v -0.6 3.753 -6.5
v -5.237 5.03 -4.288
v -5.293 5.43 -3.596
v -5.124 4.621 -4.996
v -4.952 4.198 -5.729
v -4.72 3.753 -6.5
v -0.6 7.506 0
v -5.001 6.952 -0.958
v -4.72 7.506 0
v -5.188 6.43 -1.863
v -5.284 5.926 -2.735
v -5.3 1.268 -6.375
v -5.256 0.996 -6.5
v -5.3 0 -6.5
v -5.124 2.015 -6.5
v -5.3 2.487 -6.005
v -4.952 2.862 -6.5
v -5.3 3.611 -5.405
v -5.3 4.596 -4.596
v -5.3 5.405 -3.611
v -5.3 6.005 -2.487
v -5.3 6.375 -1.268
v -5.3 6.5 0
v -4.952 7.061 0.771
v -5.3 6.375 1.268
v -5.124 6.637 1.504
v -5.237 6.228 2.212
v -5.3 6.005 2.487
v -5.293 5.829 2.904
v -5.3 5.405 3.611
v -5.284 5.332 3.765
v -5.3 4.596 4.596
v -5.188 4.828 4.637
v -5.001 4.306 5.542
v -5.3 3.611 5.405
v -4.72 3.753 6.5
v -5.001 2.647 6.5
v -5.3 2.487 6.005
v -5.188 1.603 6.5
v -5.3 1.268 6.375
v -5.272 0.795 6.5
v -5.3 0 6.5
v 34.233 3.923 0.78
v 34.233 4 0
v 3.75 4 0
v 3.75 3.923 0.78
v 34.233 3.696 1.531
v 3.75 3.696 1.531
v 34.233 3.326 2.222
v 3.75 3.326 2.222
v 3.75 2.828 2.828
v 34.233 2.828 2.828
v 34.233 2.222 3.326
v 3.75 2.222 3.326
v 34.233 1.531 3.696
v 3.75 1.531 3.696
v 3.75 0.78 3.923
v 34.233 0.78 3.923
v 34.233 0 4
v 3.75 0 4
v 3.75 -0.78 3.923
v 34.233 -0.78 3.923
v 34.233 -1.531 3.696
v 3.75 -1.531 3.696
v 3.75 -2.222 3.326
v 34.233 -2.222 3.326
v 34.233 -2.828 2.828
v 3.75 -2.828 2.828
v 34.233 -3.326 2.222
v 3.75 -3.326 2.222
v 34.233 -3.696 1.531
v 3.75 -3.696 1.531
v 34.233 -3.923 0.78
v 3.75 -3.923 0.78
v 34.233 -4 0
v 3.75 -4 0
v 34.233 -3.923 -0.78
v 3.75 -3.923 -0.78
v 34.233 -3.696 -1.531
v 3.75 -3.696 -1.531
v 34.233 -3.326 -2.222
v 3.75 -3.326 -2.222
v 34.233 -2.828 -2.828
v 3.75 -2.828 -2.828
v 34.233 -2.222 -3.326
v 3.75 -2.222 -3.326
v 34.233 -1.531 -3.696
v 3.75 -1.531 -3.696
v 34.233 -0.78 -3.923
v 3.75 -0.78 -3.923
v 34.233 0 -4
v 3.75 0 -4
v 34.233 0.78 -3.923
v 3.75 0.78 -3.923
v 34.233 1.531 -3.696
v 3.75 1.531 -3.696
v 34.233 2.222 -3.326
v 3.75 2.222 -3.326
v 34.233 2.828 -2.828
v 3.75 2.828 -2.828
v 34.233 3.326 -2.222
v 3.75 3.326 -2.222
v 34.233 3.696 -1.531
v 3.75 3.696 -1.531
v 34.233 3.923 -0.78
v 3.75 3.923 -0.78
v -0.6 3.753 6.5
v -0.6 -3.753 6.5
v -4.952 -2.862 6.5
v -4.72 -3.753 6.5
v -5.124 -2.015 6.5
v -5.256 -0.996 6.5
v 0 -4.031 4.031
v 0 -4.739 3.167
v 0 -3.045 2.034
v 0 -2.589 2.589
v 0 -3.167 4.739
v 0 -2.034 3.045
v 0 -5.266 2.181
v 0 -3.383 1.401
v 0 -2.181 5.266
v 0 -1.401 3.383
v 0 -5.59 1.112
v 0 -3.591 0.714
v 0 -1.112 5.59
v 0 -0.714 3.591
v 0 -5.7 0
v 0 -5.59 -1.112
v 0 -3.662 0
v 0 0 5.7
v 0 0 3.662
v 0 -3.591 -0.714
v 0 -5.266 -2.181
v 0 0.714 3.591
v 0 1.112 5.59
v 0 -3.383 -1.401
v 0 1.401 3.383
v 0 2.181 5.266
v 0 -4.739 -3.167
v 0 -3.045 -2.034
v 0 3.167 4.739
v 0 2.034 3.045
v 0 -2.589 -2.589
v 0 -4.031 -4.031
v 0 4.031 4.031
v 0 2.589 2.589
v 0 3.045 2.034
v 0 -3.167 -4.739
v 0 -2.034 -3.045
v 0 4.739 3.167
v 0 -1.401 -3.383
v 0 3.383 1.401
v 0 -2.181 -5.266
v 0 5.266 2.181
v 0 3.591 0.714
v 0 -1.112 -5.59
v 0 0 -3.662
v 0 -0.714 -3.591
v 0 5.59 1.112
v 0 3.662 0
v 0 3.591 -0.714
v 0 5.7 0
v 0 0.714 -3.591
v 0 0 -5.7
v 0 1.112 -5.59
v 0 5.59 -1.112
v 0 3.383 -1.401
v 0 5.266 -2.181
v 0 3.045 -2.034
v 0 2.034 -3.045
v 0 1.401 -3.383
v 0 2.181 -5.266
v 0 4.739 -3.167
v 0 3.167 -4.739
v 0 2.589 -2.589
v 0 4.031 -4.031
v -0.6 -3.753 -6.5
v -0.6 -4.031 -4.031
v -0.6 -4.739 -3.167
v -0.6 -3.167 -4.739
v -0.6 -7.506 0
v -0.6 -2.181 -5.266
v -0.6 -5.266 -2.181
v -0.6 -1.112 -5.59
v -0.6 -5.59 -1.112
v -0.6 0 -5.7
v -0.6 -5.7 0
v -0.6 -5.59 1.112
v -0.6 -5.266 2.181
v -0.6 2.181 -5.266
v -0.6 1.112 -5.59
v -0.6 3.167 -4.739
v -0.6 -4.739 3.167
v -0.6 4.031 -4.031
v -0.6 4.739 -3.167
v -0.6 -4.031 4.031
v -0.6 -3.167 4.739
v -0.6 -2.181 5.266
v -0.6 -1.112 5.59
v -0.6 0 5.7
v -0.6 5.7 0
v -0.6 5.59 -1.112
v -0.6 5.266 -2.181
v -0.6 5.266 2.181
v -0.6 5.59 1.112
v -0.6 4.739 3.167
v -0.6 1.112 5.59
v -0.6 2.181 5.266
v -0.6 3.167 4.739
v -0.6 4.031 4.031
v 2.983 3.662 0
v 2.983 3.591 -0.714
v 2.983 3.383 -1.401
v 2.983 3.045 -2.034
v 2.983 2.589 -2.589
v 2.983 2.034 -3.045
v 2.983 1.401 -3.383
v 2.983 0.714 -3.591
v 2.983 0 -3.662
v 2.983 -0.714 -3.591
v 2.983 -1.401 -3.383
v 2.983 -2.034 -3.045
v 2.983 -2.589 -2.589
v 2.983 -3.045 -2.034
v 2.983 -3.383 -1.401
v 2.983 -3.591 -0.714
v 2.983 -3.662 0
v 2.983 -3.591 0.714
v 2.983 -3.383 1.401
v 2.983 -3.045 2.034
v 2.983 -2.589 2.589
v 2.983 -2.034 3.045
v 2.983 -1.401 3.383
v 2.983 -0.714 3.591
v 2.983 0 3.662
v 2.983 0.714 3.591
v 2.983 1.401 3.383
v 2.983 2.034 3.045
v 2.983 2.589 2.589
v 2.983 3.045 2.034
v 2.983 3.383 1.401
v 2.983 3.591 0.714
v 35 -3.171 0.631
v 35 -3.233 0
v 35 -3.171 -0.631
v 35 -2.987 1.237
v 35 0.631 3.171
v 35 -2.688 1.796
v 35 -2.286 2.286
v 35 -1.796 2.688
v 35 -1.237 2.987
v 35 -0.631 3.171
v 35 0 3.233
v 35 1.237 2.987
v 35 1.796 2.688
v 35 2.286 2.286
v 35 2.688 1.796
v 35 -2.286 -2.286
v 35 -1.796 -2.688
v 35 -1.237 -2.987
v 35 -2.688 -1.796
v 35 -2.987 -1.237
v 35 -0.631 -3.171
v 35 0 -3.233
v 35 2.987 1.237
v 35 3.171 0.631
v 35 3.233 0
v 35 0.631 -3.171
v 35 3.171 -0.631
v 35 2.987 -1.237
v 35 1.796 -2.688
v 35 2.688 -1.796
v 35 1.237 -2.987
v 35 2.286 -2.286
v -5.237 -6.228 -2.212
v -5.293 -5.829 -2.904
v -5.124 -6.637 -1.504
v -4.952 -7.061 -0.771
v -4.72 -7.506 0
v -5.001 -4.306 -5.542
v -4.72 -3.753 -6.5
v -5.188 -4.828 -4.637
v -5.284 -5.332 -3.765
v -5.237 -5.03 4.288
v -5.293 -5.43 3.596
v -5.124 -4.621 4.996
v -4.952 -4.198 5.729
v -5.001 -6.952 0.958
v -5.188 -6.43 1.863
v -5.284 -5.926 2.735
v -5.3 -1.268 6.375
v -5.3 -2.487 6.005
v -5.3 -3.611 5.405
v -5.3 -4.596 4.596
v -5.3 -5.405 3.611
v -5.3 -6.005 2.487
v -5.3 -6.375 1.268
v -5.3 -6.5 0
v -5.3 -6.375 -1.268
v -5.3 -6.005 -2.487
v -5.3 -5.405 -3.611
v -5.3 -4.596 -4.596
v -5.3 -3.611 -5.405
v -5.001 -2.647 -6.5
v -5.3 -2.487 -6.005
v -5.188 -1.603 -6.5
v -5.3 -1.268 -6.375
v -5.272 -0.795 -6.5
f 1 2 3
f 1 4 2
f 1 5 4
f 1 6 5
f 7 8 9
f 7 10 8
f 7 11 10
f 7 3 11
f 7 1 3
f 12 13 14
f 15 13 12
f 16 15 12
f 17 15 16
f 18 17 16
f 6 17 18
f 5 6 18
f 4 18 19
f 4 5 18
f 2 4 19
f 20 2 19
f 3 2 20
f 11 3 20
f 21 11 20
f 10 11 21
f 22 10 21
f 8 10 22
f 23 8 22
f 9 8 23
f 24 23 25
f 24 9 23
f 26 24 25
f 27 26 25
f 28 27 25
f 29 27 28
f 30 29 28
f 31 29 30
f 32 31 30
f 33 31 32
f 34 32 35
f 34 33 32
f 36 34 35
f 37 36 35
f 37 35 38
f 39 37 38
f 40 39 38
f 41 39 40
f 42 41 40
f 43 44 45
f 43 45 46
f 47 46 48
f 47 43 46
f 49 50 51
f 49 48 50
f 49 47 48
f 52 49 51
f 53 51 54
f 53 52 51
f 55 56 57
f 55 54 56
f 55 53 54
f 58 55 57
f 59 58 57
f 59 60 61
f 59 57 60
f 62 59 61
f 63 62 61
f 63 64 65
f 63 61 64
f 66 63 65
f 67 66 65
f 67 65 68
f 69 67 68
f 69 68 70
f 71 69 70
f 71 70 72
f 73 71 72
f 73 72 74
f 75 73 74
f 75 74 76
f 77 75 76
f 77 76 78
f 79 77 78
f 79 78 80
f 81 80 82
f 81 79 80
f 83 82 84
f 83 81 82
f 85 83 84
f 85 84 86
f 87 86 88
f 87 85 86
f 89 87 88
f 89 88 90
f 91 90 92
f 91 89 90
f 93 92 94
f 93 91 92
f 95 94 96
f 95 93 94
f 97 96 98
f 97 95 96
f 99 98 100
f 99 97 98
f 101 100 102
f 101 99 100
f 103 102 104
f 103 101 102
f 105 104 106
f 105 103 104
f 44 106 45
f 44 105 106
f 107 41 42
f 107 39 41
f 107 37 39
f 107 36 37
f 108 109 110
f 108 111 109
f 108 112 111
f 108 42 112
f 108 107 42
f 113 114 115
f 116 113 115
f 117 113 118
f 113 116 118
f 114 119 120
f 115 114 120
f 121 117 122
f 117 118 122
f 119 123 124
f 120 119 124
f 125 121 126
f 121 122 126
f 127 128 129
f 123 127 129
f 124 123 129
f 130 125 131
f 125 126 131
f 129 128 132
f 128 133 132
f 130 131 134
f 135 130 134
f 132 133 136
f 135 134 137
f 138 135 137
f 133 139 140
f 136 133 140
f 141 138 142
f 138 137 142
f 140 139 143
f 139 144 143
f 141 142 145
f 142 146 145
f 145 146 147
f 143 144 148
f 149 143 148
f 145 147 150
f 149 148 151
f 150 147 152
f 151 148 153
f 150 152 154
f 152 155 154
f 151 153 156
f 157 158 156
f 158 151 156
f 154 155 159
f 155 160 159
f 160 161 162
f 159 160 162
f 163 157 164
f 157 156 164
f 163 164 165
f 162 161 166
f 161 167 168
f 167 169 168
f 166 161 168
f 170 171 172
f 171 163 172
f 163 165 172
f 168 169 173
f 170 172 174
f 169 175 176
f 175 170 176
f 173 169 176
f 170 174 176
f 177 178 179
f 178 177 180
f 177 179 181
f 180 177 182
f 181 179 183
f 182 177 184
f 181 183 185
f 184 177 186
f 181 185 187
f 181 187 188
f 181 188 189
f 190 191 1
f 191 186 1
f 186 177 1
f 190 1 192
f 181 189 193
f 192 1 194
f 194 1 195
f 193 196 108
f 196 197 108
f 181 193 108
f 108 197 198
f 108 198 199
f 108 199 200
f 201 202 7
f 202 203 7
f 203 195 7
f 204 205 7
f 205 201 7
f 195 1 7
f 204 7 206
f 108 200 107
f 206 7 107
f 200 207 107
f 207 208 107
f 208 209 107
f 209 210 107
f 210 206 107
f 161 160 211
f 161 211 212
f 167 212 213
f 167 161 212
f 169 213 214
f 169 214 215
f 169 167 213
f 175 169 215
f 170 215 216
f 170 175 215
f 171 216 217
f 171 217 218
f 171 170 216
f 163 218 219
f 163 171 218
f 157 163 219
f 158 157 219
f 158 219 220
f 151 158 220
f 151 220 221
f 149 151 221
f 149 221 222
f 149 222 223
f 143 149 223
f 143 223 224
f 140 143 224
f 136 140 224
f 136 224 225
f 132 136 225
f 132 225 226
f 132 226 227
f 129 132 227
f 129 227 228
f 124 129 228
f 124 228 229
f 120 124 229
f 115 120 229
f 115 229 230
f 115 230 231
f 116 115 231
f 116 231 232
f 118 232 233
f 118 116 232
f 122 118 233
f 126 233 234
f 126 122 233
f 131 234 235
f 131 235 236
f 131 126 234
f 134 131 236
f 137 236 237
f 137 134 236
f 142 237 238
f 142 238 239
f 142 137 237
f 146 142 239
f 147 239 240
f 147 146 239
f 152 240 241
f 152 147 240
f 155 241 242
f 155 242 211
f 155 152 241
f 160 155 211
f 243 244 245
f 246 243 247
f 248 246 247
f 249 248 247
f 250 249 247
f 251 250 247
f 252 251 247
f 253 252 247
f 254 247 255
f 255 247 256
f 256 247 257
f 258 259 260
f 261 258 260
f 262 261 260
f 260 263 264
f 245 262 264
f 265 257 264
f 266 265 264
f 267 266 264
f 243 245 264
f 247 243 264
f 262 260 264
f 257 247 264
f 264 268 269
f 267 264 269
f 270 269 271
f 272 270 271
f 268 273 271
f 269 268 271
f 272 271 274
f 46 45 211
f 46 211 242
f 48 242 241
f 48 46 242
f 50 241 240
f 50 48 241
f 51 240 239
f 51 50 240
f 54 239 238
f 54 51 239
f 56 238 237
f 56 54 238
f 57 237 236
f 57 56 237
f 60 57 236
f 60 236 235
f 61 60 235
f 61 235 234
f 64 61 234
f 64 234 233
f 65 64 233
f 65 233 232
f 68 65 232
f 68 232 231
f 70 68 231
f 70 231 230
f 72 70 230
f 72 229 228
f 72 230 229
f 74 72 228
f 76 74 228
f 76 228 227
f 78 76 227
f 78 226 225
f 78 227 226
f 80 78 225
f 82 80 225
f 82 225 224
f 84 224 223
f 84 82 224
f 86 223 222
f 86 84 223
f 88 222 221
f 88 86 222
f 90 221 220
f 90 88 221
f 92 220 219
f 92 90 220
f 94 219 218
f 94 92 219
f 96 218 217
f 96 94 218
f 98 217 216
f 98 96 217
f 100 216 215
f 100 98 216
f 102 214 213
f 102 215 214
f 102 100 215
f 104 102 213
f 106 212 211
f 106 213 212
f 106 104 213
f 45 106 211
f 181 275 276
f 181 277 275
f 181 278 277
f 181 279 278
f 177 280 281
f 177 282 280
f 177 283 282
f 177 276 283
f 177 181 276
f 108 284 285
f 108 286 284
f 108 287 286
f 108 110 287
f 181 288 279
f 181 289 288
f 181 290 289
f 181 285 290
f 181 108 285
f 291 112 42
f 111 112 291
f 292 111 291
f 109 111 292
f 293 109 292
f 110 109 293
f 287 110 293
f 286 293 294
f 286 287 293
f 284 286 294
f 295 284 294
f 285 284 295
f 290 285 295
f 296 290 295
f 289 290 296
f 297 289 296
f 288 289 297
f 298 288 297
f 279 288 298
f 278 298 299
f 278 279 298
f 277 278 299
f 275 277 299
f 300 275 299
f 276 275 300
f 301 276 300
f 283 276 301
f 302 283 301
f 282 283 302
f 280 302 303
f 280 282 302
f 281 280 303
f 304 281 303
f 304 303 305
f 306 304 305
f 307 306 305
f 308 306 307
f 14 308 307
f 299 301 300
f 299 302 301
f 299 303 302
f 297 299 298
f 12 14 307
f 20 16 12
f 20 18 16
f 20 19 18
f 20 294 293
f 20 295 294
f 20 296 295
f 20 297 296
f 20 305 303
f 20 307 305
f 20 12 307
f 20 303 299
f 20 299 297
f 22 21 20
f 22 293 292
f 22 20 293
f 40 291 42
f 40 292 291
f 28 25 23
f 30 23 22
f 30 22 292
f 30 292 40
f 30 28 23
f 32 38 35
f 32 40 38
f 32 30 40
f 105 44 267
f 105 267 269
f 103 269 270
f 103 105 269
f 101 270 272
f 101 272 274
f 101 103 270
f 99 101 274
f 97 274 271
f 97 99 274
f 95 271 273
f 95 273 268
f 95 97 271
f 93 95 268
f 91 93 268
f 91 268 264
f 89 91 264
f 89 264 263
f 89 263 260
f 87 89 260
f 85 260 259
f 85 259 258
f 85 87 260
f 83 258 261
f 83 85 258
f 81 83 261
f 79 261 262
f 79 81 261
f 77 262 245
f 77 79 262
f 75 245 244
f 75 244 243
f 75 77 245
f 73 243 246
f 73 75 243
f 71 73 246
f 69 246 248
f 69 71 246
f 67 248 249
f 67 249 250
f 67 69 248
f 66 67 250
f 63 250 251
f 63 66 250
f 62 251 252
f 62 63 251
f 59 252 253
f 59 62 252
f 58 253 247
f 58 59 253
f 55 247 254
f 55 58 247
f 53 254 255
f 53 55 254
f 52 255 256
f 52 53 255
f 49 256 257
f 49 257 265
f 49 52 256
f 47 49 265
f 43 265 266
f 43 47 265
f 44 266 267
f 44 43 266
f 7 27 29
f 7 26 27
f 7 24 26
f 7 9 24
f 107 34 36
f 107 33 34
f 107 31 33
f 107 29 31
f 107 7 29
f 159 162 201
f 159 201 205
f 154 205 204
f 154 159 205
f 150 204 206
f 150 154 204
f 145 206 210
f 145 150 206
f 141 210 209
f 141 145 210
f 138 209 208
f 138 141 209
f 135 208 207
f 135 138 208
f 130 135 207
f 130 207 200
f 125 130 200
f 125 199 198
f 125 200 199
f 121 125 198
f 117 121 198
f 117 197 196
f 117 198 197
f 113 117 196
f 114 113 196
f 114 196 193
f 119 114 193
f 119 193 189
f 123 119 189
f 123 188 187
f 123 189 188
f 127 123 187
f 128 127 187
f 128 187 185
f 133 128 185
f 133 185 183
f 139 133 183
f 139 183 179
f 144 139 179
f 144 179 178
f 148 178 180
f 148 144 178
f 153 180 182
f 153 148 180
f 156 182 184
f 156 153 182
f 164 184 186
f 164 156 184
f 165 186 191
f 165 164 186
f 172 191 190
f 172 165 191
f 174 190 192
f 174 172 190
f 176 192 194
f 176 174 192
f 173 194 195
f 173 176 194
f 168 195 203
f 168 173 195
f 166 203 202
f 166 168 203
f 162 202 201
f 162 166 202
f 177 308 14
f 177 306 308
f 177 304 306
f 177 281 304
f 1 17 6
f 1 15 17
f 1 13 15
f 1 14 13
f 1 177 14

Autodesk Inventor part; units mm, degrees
ref_plane "YZ Plane" through (0, 0, 0) normal (1, 0, 0) x (0, 1, 0)
ref_plane "XZ Plane" through (0, 0, 0) normal (0, 1, 0) x (-1, 0, 0)
sketch "Sketch1" plane through (0, 0, 0) normal (0, 0, 1) x (1, 0, 0)
  line L0 (0, 5.7) -> (0, 3.6617)
  line L1 (3.75, 4) -> (35, 4)
  line L2 (35, 4) -> (35, 0)
  line L3 (35, 0) -> (-0.6001, 0)
  line L4 (-7.7201, 0) -> (42.12, 0) projected
  line L5 (-0.6001, 0) -> (-0.6001, 5.7)
  line L6 (-0.6001, 5.7) -> (0, 5.7)
  line L7 (3.75, 4) -> (2.9831, 3.6617)
  line L8 (2.9831, 3.6617) -> (0, 3.6617)
  line L9 (0, -1.14) -> (0, 6.84) projected
  dimension "d0" = 35
  dimension "d1" = 31.25
  dimension "d2" = 8
  dimension "d9" = 0.6001
  dimension "d10" = 11.4
  dimension "d13" = 0.7669
  dimension "d14" = 7.3234
revolve "Body" add sketch "Sketch1" angle 360 about axis through (35, 0, 0) along (-1, 0, 0)
sketch "Sketch2" plane through (-0.6001, 0, 0) normal (-1, 0, 0) x (0, 0, 1)
  line L0 (0, 7.5056) -> (6.5, 3.7528)
  line L1 (6.5, 3.7528) -> (6.5, -3.7528)
  line L2 (6.5, -3.7528) -> (0, -7.5056)
  line L3 (0, -7.5056) -> (-6.5, -3.7528)
  line L4 (-6.5, -3.7528) -> (-6.5, 3.7528)
  line L5 (-6.5, 3.7528) -> (0, 7.5056)
  point P0 (0, 0)
  point P1 (0, 0)
  dimension "d11" = 13
extrude "Head" add sketch "Sketch2" along normal blind 4.7
sketch "Sketch4" plane through (0, 0, 0) normal (0, 0, 1) x (1, 0, 0)
  line L0 (-5.3001, 6.5) -> (-5.3001, 7.5056)
  line L1 (-5.3001, 7.5056) -> (-4.7195, 7.5056)
  line L2 (-4.7195, 7.5056) -> (-5.3001, 6.5)
  line L3 (-6.2401, 0) -> (0.3399, 0) projected
  line L4 (-0.6001, 7.5056) -> (-5.3001, 7.5056) projected
  line L5 (-5.3001, 3.7528) -> (-5.3001, 7.5056) projected
  dimension "d5" = 30
  dimension "d19" = 13
revolve "Chamfer1" cut sketch "Sketch4" angle 360 about axis through (-10, 0, 0) along (1, 0, 0)
thread "Thread" size "M8x1.25" class "6g" standard "ISO Metric profile" length 31.25
chamfer "Chamfer2" distance 0.7668 distance2 0.7669 1 edges at (35, -4, 0) measured on face at (35, -0.3588, 0.308)
ref_plane "Work Plane1" through (1.525, 0, 0) normal (0, 0, 1) x (1, 0, 0)
equation "\"d0\" = NLG"
equation "\"d1\" = GEL"
equation "\"d2\" = GD"
equation "\"d10\" = SD2"
equation "\"d14\" = BDM"
equation "\"d11\" = SW"
equation "\"d3\" = KOH - SD"
equation "\"d5\" = ANG1"
equation "\"d19\" = SW0"
equation "\"d15\" = GEL"
equation "\"d6\" = -0.5 * SPD + 0.5 * GD"
equation "\"NLG\" = 35"
equation "\"GD\" = NND"
equation "\"BDM\" = 7.32342"
equation "\"KOH\" = 5.3"
equation "\"GEL\" = 31.25"
equation "\"SW\" = 13"
equation "\"SW0\" = 13"
equation "\"SPD\" = NND - 1.2269 * PTC"
equation "\"SD2\" = 11.4"
equation "\"SD\" = 0.6"
equation "\"ANG1\" = 30deg"
equation "\"GAL\" = 0.61345 * PTC"
equation "\"GUL\" = 0.61345 * PTC"
equation "\"RR\" = 0.4"
equation "\"GD1\" = THREADDIA - 1.2269 * PTC"
equation "\"THREADDIA\" = 8"
equation "\"TOA\" = 30deg"
equation "\"PTC\" = 1.25"
equation "\"NND\" = 8"
equation "\"E0\" = 1.155 * SW"
properties part number "DIN 933 - M8  x 35" material "Steel, Mild"
